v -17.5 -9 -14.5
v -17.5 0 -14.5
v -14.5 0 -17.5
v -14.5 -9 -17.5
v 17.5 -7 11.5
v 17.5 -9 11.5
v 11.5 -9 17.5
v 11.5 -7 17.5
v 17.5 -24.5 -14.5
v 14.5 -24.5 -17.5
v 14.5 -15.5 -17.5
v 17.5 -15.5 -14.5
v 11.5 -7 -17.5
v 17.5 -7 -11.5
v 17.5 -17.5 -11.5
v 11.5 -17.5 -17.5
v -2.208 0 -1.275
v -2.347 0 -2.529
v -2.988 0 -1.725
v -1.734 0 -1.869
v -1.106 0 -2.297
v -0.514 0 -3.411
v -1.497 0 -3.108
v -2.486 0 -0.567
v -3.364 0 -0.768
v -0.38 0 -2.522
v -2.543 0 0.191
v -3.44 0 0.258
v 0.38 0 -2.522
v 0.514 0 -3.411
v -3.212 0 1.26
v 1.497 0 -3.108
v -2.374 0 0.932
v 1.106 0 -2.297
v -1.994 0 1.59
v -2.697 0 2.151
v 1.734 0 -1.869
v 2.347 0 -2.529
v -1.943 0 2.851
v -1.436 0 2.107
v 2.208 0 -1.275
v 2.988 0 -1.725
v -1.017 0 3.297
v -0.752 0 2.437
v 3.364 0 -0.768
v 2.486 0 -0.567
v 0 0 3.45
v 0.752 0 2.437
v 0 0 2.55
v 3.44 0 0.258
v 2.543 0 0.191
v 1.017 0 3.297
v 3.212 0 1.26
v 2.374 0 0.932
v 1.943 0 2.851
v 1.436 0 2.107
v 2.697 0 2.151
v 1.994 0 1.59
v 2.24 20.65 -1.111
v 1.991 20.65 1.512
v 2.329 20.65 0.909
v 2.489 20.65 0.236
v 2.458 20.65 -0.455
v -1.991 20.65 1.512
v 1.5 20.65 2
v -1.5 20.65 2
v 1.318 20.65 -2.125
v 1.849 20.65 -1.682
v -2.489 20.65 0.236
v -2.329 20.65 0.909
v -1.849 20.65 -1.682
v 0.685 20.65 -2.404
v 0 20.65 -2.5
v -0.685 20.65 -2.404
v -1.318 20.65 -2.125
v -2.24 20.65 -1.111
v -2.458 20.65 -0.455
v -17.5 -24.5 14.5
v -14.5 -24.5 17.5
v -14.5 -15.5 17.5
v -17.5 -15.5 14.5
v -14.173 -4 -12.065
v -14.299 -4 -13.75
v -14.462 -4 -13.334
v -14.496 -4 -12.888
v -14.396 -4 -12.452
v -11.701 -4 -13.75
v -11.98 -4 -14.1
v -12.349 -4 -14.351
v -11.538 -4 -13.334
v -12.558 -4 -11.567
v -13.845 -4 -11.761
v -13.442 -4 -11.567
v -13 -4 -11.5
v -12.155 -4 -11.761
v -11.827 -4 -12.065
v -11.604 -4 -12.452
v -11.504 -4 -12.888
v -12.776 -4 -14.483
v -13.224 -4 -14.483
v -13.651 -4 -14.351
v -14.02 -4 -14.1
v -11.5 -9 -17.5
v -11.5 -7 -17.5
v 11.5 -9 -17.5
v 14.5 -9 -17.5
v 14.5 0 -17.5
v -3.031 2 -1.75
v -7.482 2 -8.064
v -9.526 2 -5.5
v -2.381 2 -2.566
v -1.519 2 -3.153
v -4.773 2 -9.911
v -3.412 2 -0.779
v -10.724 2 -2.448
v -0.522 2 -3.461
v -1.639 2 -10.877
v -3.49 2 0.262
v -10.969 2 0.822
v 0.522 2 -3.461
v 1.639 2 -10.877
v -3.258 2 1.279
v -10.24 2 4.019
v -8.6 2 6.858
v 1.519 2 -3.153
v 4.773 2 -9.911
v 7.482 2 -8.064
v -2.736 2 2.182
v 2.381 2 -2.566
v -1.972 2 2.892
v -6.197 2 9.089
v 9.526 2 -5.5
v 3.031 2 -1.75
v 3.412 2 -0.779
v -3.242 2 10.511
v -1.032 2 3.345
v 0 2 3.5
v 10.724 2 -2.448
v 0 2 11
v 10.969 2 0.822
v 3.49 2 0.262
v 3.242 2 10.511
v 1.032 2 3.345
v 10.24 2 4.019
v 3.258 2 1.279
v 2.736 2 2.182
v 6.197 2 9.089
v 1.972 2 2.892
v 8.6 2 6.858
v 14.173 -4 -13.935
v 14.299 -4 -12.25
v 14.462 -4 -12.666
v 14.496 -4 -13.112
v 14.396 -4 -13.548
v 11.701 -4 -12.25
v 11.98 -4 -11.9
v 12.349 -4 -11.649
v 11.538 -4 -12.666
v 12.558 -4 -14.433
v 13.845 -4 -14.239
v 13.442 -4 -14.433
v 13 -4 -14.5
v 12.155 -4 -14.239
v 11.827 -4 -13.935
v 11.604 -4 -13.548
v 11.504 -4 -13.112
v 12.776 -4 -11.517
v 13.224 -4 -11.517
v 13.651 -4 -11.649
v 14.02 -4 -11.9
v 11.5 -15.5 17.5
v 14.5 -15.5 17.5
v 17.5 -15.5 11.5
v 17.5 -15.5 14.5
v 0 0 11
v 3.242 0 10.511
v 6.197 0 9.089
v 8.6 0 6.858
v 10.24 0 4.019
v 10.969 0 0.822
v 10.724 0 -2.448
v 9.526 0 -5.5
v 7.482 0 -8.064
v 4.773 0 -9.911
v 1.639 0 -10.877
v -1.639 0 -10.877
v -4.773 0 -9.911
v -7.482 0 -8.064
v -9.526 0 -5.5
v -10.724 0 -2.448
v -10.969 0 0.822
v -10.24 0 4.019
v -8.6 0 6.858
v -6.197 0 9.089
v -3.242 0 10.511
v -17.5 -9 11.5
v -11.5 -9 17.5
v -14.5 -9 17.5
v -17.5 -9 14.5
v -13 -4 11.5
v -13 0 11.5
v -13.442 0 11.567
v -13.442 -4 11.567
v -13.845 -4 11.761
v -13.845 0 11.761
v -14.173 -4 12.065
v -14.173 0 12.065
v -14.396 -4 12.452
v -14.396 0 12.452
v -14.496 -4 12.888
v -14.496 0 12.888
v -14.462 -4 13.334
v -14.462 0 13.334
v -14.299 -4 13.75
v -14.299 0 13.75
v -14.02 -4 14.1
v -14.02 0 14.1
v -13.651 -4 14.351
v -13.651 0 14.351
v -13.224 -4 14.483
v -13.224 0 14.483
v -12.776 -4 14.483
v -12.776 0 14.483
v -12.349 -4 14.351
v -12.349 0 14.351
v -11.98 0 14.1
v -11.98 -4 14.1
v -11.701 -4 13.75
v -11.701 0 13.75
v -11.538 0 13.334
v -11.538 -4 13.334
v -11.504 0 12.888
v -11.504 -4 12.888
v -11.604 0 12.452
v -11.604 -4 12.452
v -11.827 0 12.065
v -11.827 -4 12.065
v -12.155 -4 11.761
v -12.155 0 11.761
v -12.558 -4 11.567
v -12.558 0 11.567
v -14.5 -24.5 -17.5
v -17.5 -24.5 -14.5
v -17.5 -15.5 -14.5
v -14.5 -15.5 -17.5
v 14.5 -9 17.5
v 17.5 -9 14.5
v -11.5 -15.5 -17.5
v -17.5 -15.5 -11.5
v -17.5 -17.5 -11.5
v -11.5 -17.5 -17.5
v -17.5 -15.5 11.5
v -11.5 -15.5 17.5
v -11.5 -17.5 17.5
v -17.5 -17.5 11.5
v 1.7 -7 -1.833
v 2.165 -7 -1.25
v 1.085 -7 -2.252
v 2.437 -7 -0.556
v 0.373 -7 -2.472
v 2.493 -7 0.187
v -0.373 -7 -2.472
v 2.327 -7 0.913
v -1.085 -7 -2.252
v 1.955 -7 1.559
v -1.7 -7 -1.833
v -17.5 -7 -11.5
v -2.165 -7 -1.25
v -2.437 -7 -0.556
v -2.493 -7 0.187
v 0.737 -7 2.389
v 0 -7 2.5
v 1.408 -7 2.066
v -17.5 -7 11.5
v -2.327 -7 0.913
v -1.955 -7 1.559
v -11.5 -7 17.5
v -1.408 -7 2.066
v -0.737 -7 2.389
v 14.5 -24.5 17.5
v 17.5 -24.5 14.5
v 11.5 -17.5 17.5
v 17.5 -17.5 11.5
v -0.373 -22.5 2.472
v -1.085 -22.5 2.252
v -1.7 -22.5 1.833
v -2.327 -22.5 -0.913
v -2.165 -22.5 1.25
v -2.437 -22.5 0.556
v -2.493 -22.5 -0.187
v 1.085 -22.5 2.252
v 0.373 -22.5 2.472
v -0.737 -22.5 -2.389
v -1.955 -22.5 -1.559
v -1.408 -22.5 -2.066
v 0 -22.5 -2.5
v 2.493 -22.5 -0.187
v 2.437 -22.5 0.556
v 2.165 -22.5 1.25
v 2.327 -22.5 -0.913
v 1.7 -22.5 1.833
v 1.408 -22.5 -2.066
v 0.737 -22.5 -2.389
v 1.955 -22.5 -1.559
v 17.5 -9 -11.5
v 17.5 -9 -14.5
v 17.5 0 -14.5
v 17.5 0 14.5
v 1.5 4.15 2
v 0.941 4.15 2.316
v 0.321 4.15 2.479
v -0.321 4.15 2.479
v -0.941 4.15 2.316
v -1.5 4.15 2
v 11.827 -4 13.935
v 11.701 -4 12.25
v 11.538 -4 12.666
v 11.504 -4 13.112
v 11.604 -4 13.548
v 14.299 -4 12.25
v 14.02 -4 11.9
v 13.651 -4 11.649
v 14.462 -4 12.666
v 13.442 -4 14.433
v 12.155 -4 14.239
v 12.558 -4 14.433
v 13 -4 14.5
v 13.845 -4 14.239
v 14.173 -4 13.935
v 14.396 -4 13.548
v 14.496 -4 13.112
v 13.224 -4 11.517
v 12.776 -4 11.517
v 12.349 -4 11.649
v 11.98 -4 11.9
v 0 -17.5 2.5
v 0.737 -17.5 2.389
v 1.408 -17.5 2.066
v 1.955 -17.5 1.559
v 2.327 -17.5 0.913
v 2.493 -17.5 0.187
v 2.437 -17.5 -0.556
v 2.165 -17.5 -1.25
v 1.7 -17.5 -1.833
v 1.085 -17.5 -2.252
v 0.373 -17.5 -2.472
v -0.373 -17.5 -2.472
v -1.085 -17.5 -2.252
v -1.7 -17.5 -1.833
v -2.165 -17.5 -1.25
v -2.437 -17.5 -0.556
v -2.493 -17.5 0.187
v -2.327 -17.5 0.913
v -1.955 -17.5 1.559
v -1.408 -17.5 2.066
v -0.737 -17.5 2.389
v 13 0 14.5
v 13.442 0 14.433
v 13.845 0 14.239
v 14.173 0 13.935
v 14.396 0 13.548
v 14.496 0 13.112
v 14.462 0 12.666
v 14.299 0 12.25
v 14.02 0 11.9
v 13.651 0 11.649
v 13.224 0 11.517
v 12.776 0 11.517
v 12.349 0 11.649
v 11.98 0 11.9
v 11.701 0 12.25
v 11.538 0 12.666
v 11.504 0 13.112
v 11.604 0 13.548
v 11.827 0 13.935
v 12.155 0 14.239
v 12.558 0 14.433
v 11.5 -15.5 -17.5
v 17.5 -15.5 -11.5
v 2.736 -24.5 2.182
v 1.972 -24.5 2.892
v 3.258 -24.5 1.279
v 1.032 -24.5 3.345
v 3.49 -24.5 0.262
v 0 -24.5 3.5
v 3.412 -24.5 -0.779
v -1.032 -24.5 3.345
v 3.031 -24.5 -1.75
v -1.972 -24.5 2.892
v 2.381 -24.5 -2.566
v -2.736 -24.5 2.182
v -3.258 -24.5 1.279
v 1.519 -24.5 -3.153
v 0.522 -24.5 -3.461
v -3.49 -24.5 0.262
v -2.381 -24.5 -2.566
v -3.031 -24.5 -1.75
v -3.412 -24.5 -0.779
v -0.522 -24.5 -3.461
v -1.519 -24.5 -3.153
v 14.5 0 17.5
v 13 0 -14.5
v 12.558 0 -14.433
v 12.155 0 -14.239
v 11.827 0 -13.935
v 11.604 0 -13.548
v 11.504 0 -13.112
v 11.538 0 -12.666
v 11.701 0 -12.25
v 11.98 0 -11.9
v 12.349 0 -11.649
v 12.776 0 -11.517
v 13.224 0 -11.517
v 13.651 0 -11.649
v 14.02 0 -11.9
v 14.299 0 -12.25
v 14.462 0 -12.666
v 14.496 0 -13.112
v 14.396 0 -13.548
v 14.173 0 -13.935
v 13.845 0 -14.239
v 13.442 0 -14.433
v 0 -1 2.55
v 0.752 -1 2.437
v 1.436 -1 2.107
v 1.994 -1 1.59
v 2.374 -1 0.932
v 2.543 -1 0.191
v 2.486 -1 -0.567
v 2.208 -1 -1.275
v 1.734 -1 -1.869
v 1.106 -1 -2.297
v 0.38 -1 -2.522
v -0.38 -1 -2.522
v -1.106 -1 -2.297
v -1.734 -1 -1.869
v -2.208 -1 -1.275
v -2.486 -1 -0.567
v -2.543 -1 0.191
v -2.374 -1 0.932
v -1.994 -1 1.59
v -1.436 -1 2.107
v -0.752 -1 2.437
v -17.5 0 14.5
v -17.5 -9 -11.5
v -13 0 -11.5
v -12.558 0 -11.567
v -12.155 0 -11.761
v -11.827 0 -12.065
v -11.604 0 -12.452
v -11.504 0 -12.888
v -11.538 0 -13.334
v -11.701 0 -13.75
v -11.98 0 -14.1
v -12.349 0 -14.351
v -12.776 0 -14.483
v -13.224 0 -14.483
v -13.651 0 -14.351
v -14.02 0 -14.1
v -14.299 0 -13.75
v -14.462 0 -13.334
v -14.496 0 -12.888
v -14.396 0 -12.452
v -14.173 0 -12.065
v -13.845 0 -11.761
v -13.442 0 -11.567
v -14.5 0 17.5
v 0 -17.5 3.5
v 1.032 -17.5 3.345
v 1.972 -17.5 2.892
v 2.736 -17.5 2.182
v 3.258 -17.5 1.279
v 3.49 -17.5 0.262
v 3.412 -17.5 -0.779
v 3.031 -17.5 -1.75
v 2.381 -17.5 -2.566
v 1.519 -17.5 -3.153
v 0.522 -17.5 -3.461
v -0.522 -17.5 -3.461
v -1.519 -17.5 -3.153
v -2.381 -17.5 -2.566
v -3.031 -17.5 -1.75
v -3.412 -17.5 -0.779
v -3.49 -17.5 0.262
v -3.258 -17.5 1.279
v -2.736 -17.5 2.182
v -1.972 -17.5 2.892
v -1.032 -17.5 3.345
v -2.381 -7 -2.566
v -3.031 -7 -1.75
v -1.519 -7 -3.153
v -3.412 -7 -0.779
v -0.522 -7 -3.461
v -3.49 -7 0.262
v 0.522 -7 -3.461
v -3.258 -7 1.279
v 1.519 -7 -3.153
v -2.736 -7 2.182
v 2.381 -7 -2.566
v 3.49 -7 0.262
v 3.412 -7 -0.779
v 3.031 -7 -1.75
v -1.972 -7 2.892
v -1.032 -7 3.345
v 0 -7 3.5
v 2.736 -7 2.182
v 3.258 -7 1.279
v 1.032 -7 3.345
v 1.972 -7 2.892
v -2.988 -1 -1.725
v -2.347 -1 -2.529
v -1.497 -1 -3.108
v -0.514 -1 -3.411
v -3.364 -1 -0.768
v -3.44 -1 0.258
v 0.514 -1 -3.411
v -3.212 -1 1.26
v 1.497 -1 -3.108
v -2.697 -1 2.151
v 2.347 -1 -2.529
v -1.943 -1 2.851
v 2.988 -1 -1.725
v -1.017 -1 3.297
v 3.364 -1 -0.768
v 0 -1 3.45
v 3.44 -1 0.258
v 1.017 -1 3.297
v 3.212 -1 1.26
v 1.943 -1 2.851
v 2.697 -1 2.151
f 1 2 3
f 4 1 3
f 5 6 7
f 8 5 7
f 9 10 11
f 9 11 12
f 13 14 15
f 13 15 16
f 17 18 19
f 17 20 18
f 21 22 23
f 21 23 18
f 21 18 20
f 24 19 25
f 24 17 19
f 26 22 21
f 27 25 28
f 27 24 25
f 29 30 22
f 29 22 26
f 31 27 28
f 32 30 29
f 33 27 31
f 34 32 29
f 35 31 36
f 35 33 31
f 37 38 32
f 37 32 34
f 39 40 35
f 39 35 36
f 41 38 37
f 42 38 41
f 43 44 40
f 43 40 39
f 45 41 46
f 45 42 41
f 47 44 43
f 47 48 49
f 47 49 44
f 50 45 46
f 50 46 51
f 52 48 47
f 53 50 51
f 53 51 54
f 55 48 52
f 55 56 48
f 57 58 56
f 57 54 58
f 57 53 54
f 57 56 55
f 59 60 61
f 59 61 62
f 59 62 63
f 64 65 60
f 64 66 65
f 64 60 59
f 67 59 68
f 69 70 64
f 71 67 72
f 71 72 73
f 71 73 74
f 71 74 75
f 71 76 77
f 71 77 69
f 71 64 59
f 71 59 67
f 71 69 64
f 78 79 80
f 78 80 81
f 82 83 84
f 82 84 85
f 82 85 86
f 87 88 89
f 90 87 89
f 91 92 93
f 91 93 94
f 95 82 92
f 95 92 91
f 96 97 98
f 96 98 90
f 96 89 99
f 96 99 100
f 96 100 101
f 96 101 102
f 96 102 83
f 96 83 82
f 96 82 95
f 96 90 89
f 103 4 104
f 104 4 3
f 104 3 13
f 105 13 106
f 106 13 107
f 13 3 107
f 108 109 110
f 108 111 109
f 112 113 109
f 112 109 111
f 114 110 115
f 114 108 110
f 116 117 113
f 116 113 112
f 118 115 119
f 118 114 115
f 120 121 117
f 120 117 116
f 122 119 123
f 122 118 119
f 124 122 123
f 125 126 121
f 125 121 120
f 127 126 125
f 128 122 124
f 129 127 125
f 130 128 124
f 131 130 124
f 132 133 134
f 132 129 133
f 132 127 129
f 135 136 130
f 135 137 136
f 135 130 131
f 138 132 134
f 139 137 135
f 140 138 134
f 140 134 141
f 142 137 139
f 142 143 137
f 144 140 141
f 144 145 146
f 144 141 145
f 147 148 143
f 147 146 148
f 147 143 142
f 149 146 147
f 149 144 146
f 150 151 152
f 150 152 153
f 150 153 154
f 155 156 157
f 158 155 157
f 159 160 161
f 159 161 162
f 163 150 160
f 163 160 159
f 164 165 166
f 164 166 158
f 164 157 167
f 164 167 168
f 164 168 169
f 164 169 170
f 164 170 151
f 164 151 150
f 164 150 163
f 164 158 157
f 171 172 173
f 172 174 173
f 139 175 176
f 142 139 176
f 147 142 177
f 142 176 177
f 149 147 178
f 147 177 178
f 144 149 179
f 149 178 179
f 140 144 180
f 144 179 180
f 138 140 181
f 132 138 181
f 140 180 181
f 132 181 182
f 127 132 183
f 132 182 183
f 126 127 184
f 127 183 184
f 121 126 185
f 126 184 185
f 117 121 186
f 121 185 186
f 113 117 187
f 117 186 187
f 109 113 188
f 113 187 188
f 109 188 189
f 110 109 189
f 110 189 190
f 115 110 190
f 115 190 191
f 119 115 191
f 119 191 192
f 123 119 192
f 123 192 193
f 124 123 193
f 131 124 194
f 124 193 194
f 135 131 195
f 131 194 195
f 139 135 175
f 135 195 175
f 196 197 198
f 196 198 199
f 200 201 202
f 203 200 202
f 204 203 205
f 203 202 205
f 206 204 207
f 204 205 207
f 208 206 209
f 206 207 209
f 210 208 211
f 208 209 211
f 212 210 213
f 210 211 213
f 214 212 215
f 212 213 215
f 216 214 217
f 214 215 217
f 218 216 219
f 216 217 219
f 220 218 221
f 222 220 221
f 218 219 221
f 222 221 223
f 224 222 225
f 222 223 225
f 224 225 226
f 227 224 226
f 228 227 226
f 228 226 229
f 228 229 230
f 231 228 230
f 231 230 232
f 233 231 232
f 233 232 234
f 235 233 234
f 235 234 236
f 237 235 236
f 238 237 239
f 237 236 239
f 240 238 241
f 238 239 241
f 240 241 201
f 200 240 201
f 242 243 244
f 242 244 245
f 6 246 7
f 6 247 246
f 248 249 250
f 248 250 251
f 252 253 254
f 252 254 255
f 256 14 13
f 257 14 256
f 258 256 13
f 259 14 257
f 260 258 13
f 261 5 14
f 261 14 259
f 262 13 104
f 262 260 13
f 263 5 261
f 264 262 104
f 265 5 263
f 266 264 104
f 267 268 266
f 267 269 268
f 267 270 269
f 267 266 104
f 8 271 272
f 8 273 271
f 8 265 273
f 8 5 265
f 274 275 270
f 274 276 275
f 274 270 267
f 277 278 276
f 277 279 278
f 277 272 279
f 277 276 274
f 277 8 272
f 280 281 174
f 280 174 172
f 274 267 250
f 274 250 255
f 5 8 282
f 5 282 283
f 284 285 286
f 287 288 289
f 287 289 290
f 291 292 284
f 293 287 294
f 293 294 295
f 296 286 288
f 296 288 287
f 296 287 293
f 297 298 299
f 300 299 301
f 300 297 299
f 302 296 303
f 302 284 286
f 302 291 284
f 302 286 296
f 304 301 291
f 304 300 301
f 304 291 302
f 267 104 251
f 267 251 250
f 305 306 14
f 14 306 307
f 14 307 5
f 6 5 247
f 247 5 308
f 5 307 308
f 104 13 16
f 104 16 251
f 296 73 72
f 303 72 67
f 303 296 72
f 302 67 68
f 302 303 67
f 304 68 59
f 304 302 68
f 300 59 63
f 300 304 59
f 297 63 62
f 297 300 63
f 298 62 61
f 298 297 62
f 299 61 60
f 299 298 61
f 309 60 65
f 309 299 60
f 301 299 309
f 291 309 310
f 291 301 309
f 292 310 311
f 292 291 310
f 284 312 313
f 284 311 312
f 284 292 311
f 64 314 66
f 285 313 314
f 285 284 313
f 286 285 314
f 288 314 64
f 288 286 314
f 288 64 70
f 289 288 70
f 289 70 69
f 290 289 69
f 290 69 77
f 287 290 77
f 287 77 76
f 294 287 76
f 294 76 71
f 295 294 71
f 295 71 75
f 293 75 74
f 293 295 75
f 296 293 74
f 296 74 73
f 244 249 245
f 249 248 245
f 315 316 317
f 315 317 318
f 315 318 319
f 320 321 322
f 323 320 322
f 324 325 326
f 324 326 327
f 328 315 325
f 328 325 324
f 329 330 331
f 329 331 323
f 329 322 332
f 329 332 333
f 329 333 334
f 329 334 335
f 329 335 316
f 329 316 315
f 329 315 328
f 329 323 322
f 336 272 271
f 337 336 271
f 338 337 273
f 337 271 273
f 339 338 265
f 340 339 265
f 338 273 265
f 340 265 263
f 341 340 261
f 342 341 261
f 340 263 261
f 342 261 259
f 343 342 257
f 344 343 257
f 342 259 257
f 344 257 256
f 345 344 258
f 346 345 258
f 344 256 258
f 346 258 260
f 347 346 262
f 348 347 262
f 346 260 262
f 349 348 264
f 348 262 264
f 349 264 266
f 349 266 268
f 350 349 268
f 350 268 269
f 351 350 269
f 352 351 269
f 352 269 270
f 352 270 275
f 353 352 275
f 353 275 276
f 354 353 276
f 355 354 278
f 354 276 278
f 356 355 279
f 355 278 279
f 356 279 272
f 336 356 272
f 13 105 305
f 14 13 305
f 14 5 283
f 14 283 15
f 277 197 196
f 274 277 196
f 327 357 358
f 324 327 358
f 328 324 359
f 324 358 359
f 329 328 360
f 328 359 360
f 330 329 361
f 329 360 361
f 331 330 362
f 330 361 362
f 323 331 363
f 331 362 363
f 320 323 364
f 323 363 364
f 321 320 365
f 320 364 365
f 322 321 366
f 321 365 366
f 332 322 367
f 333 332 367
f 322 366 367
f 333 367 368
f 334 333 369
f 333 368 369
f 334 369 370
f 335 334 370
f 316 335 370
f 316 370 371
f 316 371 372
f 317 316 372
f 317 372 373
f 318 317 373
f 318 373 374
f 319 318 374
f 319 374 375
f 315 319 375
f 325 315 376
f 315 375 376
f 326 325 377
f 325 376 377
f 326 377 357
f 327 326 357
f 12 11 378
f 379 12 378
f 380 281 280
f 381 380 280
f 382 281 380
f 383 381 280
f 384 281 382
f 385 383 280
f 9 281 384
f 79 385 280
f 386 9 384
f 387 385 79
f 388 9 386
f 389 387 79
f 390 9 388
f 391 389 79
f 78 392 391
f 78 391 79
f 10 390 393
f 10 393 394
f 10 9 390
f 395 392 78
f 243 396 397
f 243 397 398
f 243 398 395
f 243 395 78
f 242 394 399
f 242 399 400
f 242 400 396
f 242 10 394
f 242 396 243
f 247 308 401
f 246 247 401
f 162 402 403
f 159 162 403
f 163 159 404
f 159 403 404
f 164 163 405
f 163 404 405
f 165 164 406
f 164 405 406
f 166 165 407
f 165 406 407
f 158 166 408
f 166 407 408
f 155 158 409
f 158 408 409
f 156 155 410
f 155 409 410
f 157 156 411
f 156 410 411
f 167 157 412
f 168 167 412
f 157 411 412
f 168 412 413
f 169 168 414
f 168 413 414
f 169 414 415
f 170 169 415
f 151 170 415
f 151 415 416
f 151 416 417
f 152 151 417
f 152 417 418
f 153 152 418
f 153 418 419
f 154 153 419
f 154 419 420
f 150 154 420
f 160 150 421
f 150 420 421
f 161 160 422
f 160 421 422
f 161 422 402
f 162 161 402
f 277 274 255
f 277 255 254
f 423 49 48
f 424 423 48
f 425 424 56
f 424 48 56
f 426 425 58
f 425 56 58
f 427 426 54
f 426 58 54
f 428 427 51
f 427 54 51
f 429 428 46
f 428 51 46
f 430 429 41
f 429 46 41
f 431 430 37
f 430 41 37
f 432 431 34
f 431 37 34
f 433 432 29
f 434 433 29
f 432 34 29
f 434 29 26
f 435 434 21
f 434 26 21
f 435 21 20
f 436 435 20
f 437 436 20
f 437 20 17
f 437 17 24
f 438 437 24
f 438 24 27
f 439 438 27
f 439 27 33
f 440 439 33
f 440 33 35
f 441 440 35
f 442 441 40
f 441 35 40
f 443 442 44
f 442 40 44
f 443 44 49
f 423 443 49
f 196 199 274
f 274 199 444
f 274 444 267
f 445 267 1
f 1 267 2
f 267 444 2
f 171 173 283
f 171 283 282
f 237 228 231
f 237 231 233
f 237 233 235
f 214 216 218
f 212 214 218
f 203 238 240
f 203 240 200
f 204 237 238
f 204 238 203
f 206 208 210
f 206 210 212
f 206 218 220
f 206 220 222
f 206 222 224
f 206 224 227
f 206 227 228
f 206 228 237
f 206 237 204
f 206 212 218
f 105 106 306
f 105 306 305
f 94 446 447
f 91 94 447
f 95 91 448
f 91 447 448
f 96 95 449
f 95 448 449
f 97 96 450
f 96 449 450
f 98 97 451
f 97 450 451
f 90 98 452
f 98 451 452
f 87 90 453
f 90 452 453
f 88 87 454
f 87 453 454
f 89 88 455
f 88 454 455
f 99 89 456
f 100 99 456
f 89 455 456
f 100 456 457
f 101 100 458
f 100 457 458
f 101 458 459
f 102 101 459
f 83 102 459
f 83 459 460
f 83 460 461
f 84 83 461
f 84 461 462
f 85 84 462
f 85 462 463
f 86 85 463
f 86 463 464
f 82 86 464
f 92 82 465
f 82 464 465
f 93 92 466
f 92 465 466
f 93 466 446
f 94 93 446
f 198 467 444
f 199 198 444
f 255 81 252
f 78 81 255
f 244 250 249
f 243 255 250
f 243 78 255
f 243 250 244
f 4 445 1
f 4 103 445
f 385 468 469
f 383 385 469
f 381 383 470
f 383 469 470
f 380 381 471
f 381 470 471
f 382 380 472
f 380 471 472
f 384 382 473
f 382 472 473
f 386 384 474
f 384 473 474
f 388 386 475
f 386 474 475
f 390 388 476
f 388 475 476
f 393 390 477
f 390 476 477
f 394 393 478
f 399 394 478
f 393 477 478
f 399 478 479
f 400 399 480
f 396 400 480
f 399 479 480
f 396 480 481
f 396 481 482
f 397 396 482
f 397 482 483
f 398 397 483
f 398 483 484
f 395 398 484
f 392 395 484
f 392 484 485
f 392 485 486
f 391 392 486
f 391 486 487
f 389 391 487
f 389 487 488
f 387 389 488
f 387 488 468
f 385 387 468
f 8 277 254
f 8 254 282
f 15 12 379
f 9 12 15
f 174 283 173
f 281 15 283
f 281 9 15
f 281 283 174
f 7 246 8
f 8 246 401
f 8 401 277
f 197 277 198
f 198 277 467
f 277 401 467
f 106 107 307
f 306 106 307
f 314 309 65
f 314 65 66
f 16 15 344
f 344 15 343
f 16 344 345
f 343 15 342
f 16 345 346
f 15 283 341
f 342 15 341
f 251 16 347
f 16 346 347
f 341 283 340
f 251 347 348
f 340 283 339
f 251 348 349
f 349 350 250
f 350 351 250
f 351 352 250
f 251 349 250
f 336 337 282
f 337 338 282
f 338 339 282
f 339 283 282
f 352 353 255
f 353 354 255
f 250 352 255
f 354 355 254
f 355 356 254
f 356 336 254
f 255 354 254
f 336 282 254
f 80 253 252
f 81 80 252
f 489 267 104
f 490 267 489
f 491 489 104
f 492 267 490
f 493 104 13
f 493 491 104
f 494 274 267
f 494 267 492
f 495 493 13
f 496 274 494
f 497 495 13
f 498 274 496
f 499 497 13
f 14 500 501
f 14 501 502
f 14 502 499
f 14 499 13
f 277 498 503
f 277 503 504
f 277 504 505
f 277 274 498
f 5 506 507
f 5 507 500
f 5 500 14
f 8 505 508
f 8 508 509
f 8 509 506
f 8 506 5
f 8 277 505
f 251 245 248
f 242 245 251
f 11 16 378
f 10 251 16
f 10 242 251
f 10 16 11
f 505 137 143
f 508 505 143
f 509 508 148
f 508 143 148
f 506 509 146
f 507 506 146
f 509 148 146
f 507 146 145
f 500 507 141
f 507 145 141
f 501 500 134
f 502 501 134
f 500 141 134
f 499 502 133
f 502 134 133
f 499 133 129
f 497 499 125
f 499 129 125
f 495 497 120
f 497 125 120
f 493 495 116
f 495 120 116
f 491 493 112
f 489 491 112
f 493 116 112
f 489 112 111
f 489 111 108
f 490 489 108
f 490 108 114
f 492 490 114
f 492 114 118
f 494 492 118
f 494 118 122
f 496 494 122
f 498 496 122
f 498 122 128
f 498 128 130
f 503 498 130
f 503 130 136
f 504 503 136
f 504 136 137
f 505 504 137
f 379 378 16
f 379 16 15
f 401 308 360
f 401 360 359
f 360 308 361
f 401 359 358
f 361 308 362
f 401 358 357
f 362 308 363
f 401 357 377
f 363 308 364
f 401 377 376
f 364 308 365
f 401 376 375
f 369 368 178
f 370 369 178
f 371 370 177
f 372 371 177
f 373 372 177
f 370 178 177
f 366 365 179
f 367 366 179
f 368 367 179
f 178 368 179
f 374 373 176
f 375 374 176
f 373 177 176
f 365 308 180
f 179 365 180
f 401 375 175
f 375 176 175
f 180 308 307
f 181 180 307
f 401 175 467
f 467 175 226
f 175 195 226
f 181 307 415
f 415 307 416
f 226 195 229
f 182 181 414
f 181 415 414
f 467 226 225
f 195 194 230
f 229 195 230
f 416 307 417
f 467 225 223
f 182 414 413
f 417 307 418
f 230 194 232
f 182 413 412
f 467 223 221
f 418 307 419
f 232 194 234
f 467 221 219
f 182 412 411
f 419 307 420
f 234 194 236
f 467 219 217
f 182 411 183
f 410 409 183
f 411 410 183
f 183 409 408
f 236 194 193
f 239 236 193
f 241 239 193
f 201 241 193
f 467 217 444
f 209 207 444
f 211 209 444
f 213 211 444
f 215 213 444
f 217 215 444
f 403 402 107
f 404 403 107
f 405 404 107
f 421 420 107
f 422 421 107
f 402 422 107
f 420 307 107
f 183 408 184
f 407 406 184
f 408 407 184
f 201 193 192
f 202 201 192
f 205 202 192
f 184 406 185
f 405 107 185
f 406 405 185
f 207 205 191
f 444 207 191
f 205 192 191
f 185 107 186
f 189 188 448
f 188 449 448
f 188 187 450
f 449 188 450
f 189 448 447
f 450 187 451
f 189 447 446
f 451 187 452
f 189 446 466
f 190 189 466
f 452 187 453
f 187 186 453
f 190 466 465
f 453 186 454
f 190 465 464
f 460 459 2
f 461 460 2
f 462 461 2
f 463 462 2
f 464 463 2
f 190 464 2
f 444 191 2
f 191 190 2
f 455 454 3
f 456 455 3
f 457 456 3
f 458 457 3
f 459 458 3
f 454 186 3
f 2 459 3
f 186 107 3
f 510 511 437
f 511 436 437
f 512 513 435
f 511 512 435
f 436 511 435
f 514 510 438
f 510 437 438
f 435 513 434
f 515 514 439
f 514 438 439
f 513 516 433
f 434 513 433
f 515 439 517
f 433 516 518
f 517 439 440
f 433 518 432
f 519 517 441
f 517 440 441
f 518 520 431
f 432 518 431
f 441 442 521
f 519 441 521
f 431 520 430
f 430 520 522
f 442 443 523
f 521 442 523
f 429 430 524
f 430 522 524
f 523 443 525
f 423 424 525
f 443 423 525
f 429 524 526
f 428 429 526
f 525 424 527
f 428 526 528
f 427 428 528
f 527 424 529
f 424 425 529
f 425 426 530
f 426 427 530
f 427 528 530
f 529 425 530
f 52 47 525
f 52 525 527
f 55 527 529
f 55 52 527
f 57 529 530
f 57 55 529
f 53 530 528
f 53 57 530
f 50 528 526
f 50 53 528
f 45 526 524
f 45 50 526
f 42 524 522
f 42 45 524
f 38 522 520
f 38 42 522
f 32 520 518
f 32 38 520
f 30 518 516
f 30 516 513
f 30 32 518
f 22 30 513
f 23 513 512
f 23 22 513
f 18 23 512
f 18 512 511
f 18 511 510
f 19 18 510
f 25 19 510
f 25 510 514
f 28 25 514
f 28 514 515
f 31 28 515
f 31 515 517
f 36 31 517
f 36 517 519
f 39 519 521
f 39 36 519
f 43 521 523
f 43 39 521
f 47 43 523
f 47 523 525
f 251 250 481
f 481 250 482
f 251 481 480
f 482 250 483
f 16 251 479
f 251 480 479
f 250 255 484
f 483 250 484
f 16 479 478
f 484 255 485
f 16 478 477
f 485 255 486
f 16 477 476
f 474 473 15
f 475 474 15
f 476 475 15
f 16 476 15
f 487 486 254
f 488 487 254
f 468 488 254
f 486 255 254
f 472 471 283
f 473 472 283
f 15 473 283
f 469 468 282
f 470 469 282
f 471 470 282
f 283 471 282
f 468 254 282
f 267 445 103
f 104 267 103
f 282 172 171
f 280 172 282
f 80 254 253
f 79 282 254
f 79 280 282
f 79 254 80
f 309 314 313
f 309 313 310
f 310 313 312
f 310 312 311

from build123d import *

# Parameters (mm, degrees)
BOSS_EXTRUDE1_DEPTH = 9
CUT_EXTRUDE7_DEPTH  = 2
BOSS_EXTRUDE2_DEPTH = 10.5
SKETCH11_R          = 11
BOSS_EXTRUDE3_DEPTH = 2
SKETCH12_R          = 2.5
CUT_EXTRUDE8_DEPTH  = 10.5
SKETCH13_R          = 3.5
CUT_EXTRUDE9_DEPTH  = 37.259481519
SKETCH14_R          = 2.5
BOSS_EXTRUDE4_DEPTH = 20.65
BOSS_EXTRUDE5_START = -2
SKETCH17_R          = 2.5
BOSS_EXTRUDE5_DEPTH = 22.5
CUT_EXTRUDE10_DEPTH = 16.5
SKETCH18_R          = 1.5
CUT_EXTRUDE11_DEPTH = 4
SKETCH19_R          = 3.45
SKETCH19_R_2        = 2.55
BOSS_EXTRUDE6_DEPTH = 1


with BuildPart() as part:
    # Sketch1 → Boss-Extrude1 (new body)
    with BuildSketch(Plane(origin=(0, 0, 0), x_dir=(1, 0, 0), z_dir=(0, 1, 0))):
        Polygon((-17.5, 14.5), (-14.5, 17.5), (14.5, 17.5), (17.5, 14.5), (17.5, -14.5), (14.5, -17.5), (-14.5, -17.5), (-17.5, -14.5), align=None)
    extrude(amount=-BOSS_EXTRUDE1_DEPTH)

    # Sketch9 → Cut-Extrude7 (cut)
    with BuildSketch(Plane.XZ.offset(9)):
        Polygon((-11.5, -17.5), (11.5, -17.5), (17.5, -11.5), (17.5, 11.5), (11.5, 17.5), (-11.5, 17.5), (-17.5, 11.5), (-17.5, -11.5), align=None)
    extrude(amount=-CUT_EXTRUDE7_DEPTH, mode=Mode.SUBTRACT)


with BuildPart() as body_2:
    # Sketch10 → Boss-Extrude2 (new body)
    with BuildSketch(Plane.XZ.offset(7)):
        Polygon((11.5, -17.5), (-11.5, -17.5), (-17.5, -11.5), (-17.5, 11.5), (-11.5, 17.5), (11.5, 17.5), (17.5, 11.5), (17.5, -11.5), align=None)
    extrude(amount=BOSS_EXTRUDE2_DEPTH)

    # Sketch12 → Cut-Extrude8 (cut)
    with BuildSketch(Plane(origin=(0, -7, 0), x_dir=(1, 0, 0), z_dir=(0, 1, 0))):
        with Locations(Location((0, 0, 0), (0, 0, 270))):
            Circle(SKETCH12_R)
    extrude(amount=-CUT_EXTRUDE8_DEPTH, mode=Mode.SUBTRACT)


with BuildPart() as body_3:
    # Mirror3: mirrored copy
    add(part.part.mirror(Plane.ZX.offset(-12.25)))


with BuildPart() as part_1:
    add(part.part)

    # Sketch11 → Boss-Extrude3 (add)
    with BuildSketch(Plane(origin=(0, 0, 0), x_dir=(1, 0, 0), z_dir=(0, 1, 0))):
        with Locations(Location((0, 0, 0), (0, 0, 270))):
            Circle(SKETCH11_R)
    extrude(amount=BOSS_EXTRUDE3_DEPTH)


with BuildPart() as cut_extrude9_tool:
    # Sketch13 → Cut-Extrude9 (new, through all)
    with BuildSketch(Plane(origin=(0, 2, 0), x_dir=(1, 0, 0), z_dir=(0, 1, 0))):
        with Locations(Location((0, 0, 0), (0, 0, 270))):
            Circle(SKETCH13_R)
    extrude(amount=-CUT_EXTRUDE9_DEPTH)


with BuildPart() as body_3_1:
    add(body_3.part)

    # Cut-Extrude9: cut by cut_extrude9_tool
    add(cut_extrude9_tool.part, mode=Mode.SUBTRACT)


with BuildPart() as part_2:
    add(part_1.part)

    # Cut-Extrude9: cut by cut_extrude9_tool
    add(cut_extrude9_tool.part, mode=Mode.SUBTRACT)

    # Sketch18 → Cut-Extrude11 (cut)
    with BuildSketch(Plane(origin=(0, 0, 0), x_dir=(1, 0, 0), z_dir=(0, 1, 0))):
        with Locations(Location((-13, 13, 0), (0, 0, 270))):
            Circle(SKETCH18_R)
        with Locations(Location((13, 13, 0), (0, 0, 90))):
            Circle(SKETCH18_R)
        with Locations(Location((13, -13, 0), (0, 0, 270))):
            Circle(SKETCH18_R)
        with Locations(Location((-13, -13, 0), (0, 0, 90))):
            Circle(SKETCH18_R)
    extrude(amount=-CUT_EXTRUDE11_DEPTH, mode=Mode.SUBTRACT)


with BuildPart() as body_4:
    # Sketch14 → Boss-Extrude4 (new body)
    with BuildSketch(Plane(origin=(0, 0, 0), x_dir=(1, 0, 0), z_dir=(0, 1, 0))):
        with Locations(Location((0, 0, 0), (0, 0, 90))):
            Circle(SKETCH14_R)
    extrude(amount=BOSS_EXTRUDE4_DEPTH)

    # Sketch17 → Boss-Extrude5 (add)
    with BuildSketch(Plane.XZ.offset(24.5).offset(BOSS_EXTRUDE5_START)):
        with Locations(Location((0, 0, 0), (0, 0, 270))):
            Circle(SKETCH17_R)
    extrude(amount=-BOSS_EXTRUDE5_DEPTH)

    # Sketch15 → Cut-Extrude10 (cut)
    with BuildSketch(Plane(origin=(0, 20.65, 0), x_dir=(1, 0, 0), z_dir=(0, 1, 0))):
        with BuildLine():
            Line((0, -2), (-1.5, -2))
            ThreePointArc((-1.5, -2), (0, -2.5), (1.5, -2))
            Line((1.5, -2), (0, -2))
        make_face()
    extrude(amount=-CUT_EXTRUDE10_DEPTH, mode=Mode.SUBTRACT)


with BuildPart() as body_5:
    # Sketch19 → Boss-Extrude6 (new body)
    with BuildSketch(Plane(origin=(0, 0, 0), x_dir=(1, 0, 0), z_dir=(0, 1, 0))):
        with Locations(Location((0, 0, 0), (0, 0, 270))):
            Circle(SKETCH19_R)
        with Locations(Location((0, 0, 0), (0, 0, 270))):
            Circle(SKETCH19_R_2, mode=Mode.SUBTRACT)
    extrude(amount=-BOSS_EXTRUDE6_DEPTH)


solid = Compound([body_2.part, body_3_1.part, part_2.part, body_4.part, body_5.part])
